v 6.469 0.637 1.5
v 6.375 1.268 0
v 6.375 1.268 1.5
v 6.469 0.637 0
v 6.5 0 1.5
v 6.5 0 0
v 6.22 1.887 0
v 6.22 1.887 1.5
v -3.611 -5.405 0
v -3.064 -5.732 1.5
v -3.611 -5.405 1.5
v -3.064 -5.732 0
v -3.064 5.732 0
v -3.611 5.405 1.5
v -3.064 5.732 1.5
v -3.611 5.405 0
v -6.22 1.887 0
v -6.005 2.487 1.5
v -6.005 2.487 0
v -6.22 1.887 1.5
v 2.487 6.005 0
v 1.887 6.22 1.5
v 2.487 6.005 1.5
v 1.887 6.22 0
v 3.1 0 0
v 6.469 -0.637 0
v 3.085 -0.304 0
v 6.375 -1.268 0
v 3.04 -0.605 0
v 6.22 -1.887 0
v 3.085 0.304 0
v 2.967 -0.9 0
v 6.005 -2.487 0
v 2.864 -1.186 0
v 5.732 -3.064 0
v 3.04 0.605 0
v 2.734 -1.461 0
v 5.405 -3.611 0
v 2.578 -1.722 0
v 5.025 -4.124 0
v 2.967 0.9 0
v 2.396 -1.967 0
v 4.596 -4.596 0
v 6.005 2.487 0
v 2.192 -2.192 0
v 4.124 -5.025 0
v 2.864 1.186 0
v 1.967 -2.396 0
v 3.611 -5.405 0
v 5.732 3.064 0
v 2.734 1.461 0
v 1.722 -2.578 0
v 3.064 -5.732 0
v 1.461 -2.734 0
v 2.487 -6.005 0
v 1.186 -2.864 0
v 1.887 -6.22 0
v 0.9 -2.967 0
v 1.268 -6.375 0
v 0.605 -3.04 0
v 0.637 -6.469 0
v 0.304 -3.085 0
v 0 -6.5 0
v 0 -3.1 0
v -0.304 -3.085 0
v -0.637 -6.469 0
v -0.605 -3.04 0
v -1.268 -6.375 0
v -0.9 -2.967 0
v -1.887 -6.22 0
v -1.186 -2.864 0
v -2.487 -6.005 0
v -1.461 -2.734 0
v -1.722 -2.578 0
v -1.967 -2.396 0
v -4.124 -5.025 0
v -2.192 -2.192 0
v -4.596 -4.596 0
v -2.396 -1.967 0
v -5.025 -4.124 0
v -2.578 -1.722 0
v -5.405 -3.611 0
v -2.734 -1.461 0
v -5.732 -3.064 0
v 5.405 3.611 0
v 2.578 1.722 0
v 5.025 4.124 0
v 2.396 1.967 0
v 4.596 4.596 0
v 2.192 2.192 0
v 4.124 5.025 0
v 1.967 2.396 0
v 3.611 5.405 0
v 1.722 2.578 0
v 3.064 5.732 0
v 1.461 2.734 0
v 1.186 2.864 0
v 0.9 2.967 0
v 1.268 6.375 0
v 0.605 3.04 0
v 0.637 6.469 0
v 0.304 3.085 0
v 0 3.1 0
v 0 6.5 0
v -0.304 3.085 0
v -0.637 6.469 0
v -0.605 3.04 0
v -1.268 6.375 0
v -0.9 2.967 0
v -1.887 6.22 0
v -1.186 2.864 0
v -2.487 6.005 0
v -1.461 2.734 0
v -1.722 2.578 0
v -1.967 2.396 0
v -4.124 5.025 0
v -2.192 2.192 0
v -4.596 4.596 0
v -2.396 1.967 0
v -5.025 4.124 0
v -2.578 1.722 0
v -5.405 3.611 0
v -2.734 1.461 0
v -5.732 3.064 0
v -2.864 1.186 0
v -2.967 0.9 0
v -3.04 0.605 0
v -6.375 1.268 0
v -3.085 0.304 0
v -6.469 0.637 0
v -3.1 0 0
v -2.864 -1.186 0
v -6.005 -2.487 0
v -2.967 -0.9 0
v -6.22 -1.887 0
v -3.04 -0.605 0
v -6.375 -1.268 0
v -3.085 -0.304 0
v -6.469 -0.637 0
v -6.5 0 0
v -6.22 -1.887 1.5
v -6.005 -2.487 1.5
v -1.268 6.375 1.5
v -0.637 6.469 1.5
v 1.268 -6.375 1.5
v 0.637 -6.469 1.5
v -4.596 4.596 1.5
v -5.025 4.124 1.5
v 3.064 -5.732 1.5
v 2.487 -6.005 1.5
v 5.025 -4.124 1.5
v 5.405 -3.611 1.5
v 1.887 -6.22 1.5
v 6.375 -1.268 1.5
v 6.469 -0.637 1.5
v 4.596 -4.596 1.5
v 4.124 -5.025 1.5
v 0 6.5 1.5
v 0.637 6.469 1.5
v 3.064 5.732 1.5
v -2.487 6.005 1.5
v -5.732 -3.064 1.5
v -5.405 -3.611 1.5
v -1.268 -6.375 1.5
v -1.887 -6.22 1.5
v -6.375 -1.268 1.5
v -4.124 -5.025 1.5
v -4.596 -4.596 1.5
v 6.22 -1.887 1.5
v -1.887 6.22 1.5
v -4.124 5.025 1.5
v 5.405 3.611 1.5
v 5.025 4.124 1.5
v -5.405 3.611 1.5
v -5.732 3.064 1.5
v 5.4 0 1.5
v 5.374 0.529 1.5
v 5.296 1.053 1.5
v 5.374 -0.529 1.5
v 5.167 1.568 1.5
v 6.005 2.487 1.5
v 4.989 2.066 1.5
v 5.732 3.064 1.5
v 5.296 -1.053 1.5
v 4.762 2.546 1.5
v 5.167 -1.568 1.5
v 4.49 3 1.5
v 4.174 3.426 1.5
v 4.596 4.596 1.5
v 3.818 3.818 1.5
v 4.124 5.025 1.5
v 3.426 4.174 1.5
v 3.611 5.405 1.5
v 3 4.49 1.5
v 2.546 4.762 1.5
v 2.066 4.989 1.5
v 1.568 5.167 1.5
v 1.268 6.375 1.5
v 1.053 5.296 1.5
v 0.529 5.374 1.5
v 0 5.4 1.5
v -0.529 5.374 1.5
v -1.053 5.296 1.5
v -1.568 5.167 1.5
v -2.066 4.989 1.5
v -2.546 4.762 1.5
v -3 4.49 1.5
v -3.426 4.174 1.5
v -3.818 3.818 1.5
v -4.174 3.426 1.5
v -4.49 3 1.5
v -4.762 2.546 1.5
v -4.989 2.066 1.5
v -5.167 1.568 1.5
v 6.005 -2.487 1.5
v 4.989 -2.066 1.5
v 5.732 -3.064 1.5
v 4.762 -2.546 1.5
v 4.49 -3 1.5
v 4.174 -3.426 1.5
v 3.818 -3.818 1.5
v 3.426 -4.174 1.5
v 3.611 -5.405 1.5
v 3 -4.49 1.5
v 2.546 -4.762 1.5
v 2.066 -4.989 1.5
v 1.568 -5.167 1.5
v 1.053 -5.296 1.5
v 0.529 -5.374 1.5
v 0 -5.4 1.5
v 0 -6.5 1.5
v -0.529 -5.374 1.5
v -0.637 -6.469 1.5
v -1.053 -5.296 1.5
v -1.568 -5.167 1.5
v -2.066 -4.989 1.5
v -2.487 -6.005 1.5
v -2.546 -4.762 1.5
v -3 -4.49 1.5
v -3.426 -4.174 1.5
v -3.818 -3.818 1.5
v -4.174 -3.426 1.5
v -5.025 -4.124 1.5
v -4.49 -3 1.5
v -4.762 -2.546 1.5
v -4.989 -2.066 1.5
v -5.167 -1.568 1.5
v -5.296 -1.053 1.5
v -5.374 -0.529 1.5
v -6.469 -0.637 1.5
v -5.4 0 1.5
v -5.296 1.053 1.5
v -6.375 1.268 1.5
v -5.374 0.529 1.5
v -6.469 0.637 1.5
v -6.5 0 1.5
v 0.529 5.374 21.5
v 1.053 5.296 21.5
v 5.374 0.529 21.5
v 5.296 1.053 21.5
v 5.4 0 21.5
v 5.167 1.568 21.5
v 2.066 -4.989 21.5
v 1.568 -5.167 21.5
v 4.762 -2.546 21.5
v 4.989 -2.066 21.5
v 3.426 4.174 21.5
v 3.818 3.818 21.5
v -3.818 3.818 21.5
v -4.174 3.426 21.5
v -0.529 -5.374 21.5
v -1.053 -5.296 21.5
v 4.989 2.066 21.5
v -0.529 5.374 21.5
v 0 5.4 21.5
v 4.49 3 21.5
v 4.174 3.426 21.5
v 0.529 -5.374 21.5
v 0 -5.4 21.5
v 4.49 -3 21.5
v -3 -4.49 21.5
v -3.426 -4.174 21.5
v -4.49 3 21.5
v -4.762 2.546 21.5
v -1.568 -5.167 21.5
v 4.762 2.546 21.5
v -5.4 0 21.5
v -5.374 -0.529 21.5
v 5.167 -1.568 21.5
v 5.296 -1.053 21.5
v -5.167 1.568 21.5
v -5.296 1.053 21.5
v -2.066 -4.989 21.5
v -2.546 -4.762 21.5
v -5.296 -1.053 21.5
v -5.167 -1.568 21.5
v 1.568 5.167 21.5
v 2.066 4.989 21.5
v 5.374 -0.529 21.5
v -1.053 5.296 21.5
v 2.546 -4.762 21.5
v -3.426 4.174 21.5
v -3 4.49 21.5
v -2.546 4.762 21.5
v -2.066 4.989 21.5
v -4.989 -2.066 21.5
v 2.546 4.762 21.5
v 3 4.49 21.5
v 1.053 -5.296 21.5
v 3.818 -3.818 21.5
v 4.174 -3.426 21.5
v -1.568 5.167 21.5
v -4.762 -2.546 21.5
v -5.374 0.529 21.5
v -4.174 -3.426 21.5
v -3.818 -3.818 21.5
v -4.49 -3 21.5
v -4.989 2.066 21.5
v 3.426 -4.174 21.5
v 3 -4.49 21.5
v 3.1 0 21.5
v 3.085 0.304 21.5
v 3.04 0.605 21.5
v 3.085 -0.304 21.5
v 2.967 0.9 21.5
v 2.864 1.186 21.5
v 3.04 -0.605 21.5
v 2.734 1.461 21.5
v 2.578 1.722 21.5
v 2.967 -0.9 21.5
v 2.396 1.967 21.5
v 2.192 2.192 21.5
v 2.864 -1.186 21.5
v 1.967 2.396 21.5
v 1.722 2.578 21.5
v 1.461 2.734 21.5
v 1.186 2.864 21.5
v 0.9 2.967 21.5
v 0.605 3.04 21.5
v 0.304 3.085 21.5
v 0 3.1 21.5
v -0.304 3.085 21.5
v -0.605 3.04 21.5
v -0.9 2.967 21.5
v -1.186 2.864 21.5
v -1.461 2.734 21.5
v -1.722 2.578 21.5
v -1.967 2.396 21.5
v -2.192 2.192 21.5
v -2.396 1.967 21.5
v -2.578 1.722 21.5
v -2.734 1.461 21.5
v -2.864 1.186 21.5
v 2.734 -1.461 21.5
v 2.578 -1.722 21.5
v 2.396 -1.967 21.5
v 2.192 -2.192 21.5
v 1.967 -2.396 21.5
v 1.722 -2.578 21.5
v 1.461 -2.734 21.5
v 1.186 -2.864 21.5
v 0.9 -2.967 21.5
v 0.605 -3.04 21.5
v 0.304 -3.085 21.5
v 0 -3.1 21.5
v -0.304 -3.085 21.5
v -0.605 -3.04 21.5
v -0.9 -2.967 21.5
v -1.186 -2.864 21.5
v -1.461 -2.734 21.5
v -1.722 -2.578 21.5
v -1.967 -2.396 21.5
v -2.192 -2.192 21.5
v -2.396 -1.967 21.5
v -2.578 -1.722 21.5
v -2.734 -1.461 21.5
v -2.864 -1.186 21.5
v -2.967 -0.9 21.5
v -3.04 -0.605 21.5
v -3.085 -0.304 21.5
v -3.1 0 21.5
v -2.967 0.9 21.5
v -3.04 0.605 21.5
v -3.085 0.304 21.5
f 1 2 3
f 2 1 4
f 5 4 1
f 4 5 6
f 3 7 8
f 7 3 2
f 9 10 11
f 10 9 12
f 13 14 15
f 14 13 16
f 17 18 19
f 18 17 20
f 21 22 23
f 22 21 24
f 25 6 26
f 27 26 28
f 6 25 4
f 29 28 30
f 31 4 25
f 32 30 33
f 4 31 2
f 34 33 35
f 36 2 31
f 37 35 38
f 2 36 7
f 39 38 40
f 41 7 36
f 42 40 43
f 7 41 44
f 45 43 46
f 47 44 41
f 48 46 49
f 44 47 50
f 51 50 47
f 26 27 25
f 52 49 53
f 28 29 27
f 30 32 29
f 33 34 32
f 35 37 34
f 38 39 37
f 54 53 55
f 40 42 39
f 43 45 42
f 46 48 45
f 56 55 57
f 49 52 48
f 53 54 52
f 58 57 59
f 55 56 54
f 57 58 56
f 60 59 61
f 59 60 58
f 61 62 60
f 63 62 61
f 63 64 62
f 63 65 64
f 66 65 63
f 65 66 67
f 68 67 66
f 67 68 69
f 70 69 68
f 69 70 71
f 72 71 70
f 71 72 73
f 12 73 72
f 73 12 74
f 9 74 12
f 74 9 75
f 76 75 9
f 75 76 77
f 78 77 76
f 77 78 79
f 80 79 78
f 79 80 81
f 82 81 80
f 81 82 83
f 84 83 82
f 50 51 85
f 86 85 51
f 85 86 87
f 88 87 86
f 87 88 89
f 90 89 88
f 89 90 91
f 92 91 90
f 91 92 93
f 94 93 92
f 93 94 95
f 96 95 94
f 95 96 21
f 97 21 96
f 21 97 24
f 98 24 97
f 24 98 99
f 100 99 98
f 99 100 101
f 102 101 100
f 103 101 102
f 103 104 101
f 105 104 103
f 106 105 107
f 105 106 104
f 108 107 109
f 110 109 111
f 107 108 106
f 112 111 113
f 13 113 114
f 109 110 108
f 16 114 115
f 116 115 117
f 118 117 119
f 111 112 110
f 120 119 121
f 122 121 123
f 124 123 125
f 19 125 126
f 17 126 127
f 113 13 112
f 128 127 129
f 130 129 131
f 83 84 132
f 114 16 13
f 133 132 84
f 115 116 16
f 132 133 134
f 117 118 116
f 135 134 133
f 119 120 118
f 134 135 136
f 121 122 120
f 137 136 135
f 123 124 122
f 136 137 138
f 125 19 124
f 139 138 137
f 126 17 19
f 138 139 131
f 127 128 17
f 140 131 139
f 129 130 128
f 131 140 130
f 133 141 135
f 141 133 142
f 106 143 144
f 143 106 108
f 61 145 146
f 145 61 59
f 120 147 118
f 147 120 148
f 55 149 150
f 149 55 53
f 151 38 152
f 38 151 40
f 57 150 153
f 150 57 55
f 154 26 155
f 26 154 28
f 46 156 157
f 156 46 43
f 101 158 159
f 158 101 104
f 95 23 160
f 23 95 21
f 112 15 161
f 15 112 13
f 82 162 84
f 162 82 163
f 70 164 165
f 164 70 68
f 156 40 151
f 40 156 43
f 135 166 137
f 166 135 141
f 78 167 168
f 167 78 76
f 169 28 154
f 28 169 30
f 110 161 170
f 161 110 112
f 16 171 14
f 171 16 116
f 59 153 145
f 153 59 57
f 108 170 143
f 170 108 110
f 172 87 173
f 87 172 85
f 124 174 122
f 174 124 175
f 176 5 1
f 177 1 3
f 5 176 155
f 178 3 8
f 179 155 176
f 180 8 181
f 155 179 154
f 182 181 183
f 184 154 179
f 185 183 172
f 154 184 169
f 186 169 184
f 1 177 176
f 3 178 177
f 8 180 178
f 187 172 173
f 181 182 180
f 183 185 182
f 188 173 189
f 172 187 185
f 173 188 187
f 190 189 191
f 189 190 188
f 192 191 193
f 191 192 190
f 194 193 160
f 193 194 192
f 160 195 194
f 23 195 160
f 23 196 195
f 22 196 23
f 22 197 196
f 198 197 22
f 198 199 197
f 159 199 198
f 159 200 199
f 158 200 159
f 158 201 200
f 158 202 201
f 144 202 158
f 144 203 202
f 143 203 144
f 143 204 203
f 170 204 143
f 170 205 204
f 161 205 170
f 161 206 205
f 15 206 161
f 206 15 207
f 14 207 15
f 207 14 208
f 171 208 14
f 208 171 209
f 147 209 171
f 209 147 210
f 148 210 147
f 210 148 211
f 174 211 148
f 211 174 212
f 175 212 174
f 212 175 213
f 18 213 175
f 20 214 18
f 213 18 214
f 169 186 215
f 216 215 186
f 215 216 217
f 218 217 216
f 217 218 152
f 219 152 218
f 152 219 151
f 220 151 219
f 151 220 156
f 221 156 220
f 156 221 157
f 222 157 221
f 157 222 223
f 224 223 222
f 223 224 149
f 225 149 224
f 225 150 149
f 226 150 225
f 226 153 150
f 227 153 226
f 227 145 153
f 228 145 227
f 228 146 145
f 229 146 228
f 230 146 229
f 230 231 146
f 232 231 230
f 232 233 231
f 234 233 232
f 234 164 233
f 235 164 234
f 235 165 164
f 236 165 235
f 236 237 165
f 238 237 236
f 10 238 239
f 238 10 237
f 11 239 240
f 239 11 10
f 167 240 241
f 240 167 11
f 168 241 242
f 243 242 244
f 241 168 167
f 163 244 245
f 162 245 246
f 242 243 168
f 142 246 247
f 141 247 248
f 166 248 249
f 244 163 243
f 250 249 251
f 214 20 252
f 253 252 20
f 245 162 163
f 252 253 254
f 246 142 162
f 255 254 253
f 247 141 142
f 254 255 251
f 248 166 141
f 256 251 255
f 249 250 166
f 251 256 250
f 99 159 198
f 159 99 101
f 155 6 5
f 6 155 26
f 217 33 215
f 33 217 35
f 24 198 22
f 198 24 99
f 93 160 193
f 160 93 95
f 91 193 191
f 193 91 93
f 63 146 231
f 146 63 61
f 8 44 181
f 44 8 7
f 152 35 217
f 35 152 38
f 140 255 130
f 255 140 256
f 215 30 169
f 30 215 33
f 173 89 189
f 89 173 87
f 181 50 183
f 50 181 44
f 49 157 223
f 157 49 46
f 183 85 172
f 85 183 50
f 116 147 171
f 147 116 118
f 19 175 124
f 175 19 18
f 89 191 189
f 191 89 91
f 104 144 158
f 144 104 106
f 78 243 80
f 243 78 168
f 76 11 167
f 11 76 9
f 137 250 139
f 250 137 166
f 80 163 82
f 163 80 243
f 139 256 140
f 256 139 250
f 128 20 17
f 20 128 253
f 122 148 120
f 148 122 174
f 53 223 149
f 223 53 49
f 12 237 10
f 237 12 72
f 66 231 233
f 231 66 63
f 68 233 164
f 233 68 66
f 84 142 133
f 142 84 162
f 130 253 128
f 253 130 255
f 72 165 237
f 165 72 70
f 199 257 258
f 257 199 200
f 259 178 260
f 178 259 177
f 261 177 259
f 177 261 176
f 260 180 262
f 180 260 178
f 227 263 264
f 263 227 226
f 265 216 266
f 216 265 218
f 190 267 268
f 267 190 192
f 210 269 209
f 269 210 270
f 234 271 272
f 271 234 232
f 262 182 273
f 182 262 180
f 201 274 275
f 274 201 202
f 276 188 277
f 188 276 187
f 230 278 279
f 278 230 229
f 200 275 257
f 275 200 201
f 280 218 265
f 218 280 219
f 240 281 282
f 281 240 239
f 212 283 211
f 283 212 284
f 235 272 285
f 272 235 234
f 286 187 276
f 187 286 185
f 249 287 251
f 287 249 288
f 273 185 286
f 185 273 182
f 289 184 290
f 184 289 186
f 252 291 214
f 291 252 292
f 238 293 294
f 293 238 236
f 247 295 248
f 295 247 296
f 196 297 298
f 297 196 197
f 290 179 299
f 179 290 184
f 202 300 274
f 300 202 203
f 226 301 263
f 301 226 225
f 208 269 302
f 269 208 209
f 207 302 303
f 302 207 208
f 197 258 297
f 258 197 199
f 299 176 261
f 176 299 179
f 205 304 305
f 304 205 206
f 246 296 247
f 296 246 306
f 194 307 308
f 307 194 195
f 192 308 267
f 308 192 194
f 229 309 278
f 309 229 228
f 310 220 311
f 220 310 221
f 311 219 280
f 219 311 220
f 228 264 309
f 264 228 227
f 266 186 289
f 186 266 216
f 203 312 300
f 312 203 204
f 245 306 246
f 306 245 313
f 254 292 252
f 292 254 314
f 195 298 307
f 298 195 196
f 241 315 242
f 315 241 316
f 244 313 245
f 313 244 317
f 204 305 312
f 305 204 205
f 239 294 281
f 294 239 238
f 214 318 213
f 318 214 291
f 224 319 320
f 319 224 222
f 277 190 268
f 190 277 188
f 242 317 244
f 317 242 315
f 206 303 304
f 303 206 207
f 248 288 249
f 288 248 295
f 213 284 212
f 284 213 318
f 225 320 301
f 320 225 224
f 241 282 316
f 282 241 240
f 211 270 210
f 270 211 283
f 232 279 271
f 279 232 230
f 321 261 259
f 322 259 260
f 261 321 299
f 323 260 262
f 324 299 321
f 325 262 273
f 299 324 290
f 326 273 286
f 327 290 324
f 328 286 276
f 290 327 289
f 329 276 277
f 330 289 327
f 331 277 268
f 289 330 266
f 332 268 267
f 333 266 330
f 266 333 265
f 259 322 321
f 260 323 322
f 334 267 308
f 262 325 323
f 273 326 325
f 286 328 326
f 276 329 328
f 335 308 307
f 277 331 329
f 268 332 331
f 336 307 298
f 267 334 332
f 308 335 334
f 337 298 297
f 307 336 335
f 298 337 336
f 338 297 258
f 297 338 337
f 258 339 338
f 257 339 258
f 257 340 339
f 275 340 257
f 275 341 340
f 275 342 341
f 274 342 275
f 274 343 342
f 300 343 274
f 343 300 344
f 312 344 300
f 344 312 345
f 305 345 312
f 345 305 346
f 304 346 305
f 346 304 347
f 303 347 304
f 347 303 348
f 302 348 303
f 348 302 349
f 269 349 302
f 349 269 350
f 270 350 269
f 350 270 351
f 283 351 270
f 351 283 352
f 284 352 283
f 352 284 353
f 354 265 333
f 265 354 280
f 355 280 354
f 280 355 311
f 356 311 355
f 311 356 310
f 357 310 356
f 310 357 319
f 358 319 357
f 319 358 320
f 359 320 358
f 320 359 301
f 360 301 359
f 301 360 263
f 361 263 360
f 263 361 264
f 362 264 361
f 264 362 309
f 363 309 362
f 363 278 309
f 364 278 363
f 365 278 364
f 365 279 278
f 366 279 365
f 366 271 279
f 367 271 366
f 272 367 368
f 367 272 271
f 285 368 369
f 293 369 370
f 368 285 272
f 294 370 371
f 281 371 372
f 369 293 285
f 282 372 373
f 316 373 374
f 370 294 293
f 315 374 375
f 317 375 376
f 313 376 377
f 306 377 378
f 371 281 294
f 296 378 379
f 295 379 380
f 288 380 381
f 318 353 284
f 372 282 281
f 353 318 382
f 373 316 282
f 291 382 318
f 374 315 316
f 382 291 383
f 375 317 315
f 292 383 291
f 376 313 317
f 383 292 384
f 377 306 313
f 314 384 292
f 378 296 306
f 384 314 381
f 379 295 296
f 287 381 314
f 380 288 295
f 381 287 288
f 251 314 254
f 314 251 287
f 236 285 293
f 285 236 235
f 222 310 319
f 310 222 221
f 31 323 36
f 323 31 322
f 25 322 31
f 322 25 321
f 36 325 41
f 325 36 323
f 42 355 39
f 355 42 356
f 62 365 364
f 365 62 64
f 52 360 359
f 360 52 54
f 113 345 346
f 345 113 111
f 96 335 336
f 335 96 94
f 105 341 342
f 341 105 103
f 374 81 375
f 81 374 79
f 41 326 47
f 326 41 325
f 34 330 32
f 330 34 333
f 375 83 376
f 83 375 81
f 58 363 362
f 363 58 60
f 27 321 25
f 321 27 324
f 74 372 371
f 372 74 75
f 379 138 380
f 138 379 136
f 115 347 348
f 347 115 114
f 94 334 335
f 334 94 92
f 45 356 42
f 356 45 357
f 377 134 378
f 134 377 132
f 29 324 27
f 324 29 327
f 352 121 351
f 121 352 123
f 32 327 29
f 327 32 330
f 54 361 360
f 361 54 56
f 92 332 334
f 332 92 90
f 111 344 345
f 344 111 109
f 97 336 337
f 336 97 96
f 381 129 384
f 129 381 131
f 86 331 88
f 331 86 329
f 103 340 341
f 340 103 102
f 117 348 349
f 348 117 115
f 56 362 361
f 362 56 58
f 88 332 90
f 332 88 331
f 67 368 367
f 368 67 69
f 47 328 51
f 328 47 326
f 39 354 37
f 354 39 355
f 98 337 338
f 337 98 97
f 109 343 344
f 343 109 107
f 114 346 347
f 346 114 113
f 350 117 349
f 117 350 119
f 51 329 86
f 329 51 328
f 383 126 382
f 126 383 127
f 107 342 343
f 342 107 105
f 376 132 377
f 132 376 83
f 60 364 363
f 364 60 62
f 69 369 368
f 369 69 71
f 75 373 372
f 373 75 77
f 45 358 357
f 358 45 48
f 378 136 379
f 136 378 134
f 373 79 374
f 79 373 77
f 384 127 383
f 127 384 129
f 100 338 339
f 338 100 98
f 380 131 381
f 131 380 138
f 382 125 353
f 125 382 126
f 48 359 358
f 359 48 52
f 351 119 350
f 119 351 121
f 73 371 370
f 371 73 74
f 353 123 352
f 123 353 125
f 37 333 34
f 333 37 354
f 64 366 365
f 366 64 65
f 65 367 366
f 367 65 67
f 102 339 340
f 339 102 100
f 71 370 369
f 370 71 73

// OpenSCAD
// Dimensions for the adapter sleeve
collar_diameter = 13;           // Diameter of the base collar (on print bed)
collar_height = 1.5;          // Height of the collar (z = 0 to 1.5)
sleeve_outer_diameter = 10.8;  // Outer diameter of the sleeve body
sleeve_height = 21.5;         // Total height from z = 0 to 21.5
bore_diameter = 6.2;              // Diameter of the central bore through the full height

// Set resolution for smooth curves
$fn = 64;

// Main body: collar + sleeve
difference() {
    // Outer shape: collar + sleeve body
    union() {
        // Collar: cylinder at base
        cylinder(h = collar_height, r = collar_diameter / 2, center = false);
        // Sleeve body: cylinder on top of collar
        translate([0, 0, collar_height])
            cylinder(h = sleeve_height - collar_height, r = sleeve_outer_diameter / 2, center = false);
    }

    // Inner bore: through the full height, centered
    // Extend slightly beyond the collar to ensure clean hole
    translate([0, 0, -0.1])
        cylinder(h = sleeve_height + 0.2, r = bore_diameter / 2, center = false);
}
